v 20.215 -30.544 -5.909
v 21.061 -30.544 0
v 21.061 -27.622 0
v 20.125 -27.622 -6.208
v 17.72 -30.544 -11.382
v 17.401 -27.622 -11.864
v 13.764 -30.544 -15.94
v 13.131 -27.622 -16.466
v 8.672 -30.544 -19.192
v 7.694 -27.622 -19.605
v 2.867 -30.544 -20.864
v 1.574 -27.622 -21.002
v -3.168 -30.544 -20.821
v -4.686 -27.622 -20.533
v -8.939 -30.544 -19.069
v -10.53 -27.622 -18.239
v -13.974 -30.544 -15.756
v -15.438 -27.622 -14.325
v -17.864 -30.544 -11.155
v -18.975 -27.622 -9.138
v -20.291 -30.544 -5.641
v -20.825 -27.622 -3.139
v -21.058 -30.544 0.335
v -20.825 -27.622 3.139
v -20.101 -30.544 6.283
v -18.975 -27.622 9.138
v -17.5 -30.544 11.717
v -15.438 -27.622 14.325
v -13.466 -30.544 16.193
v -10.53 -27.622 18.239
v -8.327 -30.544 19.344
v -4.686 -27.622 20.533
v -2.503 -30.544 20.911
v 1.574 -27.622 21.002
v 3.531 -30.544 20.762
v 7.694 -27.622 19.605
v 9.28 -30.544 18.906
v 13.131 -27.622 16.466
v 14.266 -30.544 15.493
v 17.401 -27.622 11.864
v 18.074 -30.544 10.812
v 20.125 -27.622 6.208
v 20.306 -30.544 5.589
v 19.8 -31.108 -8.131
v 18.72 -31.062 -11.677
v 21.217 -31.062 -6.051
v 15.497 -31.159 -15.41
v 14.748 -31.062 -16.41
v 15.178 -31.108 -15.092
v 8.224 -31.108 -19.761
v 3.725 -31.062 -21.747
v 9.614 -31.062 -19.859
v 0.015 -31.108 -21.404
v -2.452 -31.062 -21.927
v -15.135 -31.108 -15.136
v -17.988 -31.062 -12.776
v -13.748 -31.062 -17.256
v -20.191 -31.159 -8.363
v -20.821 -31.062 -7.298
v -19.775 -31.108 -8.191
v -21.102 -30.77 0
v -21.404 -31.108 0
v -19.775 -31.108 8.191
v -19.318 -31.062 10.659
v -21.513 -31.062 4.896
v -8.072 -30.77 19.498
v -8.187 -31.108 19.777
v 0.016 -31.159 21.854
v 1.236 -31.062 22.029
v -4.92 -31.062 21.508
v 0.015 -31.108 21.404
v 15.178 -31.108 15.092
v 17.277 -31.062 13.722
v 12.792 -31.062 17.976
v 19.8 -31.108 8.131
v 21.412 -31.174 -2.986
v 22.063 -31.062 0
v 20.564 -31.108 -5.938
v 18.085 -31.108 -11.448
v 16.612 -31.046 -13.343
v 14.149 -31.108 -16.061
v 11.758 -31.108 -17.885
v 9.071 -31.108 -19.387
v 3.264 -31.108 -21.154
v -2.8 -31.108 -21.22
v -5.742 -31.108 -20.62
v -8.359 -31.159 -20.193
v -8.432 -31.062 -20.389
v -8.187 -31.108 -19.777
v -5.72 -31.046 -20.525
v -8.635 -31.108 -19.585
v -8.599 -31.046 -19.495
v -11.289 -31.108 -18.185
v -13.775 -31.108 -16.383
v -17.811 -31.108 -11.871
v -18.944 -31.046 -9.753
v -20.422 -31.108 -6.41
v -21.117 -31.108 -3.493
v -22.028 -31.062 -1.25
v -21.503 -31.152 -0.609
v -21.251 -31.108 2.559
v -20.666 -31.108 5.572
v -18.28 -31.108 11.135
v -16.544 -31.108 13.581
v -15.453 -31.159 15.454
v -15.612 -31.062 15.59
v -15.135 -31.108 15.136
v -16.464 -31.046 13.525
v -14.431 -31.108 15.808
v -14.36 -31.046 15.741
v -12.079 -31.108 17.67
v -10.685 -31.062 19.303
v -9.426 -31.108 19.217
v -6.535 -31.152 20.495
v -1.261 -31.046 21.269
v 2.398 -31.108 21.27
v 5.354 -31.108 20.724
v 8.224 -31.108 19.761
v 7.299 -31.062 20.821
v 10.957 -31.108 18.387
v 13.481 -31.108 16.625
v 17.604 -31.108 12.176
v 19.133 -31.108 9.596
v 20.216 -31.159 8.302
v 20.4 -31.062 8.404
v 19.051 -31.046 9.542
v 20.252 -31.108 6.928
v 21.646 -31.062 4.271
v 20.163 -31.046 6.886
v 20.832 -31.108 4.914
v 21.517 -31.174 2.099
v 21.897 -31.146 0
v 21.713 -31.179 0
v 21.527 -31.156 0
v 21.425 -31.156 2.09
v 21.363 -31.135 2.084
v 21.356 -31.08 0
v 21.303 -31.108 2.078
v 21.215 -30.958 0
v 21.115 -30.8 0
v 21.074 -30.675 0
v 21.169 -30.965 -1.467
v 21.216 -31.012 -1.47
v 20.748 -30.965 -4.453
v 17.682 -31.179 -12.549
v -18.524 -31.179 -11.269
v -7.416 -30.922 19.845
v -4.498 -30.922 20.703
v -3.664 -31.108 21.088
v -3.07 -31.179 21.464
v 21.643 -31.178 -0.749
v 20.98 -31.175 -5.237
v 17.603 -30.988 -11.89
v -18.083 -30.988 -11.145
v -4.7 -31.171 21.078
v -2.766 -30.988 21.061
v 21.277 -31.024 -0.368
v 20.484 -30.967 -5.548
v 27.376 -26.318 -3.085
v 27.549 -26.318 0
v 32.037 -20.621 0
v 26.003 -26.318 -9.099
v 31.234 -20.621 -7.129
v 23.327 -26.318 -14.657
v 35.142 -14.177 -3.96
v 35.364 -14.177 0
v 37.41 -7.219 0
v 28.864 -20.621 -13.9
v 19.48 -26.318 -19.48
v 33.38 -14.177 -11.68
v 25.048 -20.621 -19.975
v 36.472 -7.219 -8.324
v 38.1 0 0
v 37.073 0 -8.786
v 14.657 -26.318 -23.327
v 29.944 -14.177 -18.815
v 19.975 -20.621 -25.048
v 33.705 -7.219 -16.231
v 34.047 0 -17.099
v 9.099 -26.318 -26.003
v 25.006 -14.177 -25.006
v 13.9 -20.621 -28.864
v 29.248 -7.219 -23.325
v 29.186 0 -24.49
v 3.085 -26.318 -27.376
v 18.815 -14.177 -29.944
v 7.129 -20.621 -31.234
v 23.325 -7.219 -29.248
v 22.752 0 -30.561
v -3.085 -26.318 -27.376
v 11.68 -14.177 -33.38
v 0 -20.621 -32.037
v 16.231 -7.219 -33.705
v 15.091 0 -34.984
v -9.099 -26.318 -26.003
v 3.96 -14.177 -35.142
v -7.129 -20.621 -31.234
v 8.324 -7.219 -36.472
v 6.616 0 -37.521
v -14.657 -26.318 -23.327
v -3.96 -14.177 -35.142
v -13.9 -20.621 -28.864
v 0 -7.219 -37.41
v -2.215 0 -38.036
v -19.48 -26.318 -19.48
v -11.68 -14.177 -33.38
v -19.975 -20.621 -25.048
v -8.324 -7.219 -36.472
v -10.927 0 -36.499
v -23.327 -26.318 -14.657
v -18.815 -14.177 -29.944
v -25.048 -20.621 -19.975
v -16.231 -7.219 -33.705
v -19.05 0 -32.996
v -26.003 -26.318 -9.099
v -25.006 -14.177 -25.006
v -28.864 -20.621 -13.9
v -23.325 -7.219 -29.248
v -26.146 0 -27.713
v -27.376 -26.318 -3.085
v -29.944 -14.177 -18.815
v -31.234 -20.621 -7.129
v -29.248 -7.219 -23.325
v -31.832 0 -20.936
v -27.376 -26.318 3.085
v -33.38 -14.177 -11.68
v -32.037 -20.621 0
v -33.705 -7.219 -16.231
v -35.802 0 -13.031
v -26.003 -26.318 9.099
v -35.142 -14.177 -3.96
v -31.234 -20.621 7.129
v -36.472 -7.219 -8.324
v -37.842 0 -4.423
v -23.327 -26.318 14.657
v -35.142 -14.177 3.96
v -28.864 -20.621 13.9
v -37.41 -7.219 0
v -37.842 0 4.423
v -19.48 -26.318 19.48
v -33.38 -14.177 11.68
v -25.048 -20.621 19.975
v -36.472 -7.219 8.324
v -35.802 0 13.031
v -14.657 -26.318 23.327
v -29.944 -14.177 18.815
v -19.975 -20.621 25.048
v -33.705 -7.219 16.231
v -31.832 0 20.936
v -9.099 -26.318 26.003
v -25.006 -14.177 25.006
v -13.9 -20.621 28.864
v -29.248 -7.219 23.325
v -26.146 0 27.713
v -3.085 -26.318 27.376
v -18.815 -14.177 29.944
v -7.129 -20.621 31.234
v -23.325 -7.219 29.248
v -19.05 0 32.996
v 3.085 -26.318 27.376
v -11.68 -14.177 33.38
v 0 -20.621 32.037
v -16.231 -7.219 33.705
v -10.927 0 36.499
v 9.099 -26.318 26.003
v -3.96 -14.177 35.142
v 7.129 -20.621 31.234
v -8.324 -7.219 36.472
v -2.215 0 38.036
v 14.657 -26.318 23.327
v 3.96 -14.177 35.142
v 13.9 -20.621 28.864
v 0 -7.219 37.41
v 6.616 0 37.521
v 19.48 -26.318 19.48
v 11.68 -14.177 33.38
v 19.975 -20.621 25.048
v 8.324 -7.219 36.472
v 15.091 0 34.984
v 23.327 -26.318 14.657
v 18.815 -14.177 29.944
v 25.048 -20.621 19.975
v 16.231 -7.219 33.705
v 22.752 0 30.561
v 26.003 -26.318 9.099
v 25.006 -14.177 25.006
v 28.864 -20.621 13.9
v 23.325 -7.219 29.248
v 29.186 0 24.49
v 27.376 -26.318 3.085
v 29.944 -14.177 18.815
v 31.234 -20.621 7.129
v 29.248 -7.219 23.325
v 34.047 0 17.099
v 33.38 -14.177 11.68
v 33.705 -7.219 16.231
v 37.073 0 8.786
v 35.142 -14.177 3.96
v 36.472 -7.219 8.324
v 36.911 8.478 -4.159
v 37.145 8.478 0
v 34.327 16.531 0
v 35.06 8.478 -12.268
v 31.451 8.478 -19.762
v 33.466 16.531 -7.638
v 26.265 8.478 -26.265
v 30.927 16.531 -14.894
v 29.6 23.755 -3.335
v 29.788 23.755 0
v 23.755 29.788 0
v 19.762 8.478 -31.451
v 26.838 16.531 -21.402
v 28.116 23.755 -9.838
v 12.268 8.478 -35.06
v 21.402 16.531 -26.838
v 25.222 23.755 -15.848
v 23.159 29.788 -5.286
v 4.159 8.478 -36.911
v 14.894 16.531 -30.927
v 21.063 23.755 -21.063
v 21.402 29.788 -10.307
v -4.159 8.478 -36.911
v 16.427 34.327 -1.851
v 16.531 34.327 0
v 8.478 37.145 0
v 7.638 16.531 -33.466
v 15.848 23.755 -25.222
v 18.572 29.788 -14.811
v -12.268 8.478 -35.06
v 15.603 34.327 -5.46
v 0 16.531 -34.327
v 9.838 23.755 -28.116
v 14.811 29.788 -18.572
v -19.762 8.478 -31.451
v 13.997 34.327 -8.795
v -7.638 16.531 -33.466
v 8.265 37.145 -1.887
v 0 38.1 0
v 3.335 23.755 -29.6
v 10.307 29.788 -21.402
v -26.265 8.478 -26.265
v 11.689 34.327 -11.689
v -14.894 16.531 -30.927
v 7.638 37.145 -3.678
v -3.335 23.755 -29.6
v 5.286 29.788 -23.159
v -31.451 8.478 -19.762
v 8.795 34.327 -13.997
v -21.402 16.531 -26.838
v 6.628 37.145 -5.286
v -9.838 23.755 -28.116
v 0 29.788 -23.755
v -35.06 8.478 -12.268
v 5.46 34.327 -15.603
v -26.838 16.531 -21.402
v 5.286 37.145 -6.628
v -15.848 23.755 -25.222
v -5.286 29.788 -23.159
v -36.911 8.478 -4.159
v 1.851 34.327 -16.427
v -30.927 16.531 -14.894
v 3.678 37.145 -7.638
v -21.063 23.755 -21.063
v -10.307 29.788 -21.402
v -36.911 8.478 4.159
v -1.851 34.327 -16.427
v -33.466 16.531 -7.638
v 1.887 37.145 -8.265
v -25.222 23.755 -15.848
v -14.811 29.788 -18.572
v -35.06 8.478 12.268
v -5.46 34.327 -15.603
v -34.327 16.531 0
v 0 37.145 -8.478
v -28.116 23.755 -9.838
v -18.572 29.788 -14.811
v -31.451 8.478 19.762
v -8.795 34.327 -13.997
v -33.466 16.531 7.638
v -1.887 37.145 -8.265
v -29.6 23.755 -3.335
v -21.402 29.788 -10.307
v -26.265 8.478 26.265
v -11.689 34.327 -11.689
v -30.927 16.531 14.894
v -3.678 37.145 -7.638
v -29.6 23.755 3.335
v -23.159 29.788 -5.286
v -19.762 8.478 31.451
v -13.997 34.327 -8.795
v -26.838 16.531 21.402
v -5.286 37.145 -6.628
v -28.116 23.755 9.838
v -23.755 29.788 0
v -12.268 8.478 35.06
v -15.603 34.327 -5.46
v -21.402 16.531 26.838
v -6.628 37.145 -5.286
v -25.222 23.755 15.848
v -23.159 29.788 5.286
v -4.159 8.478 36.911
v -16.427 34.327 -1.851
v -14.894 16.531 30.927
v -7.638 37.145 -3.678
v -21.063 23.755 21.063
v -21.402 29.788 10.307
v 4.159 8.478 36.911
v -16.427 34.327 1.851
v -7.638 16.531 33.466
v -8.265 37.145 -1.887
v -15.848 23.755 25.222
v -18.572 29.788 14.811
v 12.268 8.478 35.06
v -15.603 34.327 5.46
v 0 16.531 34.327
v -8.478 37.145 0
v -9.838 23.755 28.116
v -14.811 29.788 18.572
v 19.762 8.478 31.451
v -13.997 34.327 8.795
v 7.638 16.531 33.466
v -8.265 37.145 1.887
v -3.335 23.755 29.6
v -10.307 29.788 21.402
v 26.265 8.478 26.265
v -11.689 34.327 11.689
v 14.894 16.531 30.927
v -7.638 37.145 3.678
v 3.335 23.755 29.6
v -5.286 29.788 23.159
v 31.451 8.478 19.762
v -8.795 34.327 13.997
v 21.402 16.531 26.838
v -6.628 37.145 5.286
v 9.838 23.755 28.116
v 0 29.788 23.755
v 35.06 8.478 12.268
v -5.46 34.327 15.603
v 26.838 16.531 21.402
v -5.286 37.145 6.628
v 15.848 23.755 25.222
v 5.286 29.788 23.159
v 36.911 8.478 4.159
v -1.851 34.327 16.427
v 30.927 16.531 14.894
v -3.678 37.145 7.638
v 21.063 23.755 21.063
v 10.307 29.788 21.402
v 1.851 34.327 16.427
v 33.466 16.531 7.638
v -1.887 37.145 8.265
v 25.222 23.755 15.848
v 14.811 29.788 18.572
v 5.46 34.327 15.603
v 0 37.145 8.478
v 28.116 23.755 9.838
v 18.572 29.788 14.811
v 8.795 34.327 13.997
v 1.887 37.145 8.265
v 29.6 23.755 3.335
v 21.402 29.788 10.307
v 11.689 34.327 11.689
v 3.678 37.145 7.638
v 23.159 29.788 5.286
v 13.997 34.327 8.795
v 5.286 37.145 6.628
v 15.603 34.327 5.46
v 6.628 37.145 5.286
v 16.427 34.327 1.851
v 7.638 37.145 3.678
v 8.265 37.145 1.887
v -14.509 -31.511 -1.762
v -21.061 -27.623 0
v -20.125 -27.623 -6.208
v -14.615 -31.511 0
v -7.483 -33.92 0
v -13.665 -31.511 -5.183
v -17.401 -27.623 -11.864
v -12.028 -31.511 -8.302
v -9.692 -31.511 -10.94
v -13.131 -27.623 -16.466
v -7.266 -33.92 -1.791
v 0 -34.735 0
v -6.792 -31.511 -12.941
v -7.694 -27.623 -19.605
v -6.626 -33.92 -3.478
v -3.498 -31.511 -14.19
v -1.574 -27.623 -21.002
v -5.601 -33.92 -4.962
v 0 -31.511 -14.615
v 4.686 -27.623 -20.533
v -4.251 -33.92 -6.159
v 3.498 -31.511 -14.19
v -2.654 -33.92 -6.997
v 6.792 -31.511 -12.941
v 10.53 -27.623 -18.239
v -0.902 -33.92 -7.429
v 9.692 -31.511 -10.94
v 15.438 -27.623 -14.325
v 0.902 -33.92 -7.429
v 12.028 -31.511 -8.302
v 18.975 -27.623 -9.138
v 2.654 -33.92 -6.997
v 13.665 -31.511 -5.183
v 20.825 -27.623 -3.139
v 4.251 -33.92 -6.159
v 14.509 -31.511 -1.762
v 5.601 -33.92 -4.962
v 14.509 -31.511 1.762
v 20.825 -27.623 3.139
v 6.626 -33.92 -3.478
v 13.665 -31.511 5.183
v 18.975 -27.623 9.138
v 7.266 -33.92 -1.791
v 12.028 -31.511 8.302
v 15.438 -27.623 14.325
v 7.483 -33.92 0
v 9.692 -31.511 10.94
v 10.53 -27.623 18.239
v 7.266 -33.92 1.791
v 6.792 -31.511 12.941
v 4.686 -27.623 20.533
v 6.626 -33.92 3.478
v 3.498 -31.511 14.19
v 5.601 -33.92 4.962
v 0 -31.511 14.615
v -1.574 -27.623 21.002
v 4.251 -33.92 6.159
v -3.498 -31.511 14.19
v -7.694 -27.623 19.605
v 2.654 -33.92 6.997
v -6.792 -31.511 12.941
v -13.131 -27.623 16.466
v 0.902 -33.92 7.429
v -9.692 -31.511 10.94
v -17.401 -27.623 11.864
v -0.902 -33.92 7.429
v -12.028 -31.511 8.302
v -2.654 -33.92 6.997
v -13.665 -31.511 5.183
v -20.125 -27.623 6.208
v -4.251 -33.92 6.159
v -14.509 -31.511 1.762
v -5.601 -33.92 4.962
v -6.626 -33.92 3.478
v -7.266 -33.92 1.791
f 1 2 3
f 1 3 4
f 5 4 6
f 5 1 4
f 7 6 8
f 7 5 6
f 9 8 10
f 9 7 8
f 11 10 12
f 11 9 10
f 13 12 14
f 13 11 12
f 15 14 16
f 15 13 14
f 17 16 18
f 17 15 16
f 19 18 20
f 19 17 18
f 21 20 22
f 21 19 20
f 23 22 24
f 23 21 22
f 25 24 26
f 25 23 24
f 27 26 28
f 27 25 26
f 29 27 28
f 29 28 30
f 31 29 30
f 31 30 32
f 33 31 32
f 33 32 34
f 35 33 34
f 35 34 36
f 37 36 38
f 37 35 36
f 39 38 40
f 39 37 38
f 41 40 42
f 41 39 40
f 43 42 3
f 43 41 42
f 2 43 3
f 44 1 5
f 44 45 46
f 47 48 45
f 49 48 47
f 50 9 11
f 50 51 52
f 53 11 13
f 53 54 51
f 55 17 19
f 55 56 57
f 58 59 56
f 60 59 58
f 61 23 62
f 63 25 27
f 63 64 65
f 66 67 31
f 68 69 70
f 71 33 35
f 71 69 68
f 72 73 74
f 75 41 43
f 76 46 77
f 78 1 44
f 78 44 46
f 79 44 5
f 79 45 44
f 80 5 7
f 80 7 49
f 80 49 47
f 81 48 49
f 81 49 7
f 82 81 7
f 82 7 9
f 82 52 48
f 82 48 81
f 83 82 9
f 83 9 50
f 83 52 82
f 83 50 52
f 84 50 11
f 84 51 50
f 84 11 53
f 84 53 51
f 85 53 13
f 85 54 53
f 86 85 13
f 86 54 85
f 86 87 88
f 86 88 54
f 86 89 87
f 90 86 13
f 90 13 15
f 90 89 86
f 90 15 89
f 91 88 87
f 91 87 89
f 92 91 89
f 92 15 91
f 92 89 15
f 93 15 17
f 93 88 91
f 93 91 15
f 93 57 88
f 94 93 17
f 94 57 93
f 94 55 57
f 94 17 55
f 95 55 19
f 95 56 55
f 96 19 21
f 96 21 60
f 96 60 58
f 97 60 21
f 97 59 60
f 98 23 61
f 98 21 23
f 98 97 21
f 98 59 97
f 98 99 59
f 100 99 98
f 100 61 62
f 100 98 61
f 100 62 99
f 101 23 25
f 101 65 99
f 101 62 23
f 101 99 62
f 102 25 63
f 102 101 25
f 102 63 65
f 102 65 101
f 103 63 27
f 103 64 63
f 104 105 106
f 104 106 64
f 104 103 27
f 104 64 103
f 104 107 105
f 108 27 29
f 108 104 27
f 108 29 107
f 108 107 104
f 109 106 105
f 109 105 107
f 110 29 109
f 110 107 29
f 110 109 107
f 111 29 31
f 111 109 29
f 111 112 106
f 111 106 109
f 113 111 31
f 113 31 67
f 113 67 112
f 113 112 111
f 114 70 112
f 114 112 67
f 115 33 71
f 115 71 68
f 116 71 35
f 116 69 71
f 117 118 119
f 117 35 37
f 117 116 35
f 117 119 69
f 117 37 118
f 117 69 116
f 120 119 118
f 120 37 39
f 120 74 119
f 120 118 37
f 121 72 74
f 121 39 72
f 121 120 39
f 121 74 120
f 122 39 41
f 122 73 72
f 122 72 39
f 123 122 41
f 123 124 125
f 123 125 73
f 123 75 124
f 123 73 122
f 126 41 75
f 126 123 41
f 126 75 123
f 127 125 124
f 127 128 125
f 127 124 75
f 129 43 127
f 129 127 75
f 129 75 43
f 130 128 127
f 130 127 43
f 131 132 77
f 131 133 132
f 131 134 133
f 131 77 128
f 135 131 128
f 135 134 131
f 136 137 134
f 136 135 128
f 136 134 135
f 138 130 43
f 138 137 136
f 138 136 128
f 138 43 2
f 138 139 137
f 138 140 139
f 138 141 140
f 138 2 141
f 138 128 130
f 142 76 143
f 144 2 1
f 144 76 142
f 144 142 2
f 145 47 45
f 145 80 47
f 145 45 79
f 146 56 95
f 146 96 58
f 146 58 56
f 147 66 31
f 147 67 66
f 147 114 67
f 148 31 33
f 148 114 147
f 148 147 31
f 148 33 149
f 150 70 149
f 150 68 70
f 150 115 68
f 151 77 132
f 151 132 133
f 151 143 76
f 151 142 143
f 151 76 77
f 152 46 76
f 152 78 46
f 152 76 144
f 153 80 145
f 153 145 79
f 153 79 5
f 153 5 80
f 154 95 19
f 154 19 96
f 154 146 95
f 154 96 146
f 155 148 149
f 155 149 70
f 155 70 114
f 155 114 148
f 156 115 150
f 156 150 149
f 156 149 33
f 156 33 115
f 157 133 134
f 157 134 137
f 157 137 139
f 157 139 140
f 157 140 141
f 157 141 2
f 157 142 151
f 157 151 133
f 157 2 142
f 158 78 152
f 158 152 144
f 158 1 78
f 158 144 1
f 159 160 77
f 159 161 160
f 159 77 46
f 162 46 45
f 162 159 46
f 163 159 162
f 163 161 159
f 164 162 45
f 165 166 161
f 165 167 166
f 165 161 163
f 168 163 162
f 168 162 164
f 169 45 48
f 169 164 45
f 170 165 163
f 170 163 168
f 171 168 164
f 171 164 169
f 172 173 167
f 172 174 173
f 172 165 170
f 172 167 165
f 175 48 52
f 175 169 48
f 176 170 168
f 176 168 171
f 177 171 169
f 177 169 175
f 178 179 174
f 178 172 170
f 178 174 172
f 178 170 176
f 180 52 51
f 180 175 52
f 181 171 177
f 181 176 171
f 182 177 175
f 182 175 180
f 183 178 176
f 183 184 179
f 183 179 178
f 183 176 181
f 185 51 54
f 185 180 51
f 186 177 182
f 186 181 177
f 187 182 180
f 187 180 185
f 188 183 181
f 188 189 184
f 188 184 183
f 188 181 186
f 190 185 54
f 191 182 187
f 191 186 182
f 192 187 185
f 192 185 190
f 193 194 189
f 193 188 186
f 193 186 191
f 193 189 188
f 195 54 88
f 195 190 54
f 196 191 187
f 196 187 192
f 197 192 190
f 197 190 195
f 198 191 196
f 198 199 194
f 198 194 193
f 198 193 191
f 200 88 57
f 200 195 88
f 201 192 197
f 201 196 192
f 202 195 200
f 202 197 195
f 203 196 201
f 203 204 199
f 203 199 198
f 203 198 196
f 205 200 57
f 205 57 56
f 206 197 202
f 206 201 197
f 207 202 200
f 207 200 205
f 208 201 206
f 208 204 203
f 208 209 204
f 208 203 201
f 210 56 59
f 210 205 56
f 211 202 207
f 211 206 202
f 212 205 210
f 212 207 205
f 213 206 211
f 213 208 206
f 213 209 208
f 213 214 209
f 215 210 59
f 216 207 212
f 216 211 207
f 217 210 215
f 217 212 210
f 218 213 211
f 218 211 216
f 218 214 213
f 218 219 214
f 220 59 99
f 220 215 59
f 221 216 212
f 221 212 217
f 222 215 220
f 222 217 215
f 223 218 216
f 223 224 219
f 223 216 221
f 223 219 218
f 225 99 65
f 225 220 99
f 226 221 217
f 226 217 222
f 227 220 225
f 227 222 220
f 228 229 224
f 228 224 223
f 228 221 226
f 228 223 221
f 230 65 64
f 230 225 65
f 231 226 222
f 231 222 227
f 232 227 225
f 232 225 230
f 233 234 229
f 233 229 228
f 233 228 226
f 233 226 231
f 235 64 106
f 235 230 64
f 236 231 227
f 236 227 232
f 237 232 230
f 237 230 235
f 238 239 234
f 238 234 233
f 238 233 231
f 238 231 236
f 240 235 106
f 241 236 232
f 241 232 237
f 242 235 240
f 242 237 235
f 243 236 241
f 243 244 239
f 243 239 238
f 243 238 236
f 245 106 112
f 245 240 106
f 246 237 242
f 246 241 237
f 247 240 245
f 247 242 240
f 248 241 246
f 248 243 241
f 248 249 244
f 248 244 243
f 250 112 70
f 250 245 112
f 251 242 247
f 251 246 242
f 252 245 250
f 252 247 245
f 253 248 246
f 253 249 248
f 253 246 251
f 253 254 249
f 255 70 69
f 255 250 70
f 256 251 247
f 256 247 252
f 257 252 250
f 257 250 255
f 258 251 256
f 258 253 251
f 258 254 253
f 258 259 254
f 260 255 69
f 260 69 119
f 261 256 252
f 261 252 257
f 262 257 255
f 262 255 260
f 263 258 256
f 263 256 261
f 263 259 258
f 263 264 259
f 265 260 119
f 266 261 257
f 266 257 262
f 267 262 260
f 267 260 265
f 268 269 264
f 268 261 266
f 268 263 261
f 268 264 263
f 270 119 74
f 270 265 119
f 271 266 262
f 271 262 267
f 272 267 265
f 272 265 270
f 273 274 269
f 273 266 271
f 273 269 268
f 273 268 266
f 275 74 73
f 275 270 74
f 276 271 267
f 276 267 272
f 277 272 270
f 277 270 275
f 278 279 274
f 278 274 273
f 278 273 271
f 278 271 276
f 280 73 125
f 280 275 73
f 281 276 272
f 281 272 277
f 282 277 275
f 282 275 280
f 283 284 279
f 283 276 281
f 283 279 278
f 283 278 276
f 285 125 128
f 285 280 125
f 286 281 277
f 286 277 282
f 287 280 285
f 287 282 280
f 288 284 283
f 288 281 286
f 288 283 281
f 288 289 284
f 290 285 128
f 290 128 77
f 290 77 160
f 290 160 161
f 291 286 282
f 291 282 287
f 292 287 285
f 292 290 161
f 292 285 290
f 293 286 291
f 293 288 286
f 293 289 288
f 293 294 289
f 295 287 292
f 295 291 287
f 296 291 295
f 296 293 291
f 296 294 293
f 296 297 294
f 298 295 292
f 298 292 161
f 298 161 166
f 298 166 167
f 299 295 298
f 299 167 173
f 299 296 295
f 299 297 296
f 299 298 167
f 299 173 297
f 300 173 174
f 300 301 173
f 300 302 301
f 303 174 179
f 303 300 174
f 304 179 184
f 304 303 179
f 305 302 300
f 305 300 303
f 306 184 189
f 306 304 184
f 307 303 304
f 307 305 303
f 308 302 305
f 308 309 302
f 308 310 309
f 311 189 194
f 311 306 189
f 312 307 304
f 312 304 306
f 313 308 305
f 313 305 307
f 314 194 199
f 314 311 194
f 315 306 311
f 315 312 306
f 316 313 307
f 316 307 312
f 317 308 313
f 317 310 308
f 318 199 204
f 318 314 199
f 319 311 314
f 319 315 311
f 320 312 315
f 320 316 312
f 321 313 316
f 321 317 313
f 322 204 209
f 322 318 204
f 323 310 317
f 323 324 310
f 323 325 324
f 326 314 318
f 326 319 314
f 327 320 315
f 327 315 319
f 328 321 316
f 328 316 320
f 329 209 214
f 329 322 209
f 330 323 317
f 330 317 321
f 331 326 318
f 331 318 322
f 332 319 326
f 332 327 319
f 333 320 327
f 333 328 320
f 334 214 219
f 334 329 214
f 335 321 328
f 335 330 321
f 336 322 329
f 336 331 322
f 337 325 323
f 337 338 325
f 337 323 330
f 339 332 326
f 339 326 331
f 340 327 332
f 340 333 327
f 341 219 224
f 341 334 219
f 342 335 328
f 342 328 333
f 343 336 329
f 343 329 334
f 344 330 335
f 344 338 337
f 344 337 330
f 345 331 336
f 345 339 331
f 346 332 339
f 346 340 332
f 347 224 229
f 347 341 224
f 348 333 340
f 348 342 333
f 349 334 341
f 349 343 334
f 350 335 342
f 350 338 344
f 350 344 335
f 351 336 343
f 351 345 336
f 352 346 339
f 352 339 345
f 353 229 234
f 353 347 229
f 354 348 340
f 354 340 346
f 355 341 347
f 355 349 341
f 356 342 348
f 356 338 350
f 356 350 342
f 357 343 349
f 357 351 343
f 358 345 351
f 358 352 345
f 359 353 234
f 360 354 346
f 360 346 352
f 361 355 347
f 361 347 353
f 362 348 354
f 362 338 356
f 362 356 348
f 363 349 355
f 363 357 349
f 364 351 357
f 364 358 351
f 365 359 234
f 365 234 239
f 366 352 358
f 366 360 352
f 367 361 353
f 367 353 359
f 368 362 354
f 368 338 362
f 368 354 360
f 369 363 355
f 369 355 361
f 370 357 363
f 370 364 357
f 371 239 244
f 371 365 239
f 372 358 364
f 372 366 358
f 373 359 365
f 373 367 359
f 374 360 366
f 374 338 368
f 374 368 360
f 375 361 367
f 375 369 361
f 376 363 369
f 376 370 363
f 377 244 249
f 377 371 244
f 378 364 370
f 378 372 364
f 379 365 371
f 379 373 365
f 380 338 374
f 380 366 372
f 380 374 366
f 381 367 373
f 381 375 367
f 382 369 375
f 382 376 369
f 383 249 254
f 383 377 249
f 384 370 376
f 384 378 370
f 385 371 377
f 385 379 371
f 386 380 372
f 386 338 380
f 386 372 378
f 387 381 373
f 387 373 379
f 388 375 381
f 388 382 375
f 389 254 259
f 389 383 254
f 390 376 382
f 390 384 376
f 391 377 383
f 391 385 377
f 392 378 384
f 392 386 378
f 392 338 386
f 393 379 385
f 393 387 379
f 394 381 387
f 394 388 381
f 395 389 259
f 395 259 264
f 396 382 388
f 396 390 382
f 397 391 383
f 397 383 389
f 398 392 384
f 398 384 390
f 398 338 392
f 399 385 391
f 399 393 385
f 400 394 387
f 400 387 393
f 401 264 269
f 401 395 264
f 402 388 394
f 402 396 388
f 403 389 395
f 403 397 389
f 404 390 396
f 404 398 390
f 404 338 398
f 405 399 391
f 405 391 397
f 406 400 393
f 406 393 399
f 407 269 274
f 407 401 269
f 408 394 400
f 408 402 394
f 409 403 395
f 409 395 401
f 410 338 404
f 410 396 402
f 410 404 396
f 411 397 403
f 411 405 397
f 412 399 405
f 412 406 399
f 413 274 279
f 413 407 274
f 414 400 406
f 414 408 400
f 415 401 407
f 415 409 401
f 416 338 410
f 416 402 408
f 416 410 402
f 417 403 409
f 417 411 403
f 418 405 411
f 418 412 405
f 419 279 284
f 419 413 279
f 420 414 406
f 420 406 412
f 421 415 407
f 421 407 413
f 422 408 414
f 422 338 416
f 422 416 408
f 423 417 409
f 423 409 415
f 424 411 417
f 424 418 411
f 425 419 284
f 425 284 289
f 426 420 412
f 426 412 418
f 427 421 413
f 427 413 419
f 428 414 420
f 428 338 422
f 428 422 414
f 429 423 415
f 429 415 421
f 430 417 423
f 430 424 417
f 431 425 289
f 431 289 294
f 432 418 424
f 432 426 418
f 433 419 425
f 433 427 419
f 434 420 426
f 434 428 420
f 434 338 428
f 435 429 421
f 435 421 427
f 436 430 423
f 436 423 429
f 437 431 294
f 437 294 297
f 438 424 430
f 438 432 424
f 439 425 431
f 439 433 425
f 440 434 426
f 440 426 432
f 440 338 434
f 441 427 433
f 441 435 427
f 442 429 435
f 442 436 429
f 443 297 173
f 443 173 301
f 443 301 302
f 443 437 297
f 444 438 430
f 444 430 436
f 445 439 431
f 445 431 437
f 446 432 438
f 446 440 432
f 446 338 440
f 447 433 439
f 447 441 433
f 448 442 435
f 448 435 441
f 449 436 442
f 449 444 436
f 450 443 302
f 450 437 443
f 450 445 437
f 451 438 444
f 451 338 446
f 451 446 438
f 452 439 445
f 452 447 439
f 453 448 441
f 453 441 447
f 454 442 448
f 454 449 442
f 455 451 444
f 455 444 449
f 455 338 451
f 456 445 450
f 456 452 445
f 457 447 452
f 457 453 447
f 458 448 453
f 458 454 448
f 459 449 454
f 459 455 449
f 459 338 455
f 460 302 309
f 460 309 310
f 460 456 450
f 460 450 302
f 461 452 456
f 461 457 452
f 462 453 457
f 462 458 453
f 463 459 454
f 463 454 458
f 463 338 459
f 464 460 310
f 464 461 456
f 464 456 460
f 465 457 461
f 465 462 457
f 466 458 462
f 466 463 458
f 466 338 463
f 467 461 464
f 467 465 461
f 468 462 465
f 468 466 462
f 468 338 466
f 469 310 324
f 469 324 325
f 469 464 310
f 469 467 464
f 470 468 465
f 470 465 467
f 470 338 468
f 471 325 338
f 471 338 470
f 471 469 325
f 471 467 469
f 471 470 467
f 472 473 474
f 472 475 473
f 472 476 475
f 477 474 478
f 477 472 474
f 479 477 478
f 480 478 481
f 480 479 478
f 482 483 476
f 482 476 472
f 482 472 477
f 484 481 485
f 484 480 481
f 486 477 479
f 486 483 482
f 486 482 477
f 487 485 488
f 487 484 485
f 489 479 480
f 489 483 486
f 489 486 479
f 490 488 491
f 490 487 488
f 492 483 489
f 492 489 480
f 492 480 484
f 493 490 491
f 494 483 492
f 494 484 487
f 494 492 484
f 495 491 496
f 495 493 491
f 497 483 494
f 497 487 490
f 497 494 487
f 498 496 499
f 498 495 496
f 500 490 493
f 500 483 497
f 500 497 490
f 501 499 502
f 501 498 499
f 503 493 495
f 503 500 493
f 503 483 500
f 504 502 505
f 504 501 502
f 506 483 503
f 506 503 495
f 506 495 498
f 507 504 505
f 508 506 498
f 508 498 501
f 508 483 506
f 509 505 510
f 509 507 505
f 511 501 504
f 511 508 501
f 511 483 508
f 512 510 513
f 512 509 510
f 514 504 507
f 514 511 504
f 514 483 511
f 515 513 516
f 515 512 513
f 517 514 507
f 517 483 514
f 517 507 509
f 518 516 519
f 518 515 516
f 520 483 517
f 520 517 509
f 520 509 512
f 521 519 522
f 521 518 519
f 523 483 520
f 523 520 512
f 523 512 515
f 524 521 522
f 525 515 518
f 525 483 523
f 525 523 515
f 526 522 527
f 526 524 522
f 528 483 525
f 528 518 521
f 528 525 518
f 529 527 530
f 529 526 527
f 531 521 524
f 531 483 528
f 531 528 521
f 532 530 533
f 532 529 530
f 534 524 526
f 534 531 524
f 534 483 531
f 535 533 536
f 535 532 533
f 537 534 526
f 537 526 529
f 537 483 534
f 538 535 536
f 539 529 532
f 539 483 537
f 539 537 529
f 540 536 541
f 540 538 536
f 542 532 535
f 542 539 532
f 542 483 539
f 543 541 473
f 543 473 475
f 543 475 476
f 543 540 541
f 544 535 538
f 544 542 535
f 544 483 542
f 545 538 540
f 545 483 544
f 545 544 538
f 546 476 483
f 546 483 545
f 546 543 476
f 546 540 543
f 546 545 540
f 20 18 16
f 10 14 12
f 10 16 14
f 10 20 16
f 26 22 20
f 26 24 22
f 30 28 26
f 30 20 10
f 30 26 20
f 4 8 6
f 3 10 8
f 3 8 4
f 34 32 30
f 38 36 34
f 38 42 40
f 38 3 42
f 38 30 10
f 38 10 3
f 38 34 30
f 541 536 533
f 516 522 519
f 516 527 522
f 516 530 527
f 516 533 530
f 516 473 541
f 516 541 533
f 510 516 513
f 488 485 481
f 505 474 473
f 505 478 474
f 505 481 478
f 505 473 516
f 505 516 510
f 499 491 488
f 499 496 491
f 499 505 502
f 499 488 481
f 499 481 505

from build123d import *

# Parameters (mm, degrees)
F3_R     = 21.1666666667
F4_DEPTH = 25.4
F5_DEPTH = 4.1275
F6_R     = 0.635


with BuildPart() as f1:
    # F0 (on Top) → F1 (revolve)
    with BuildSketch(Plane.XY):
        with BuildLine():
            ThreePointArc((0, -38.1), (26.9407683632, -26.9407683632), (38.1, 0))
            ThreePointArc((38.1, 0), (26.9407683632, 26.9407683632), (0, 38.1))
            Line((0, 38.1), (0, 0))
            Line((0, 0), (0, -38.1))
        make_face()
    revolve(axis=Axis((0, 19.05, 0), (0, 1, 0)))

    # F3 (on offset) → F4 (cut)
    with BuildSketch(Plane.XZ.offset(31.75)):
        Circle(F3_R)
    extrude(amount=F4_DEPTH, mode=Mode.SUBTRACT)

    # F5 (cut): a face of the model
    f5_faces = [f1.faces().sort_by_distance(p)[0] for p in [
        (0, -31.75, 0),
    ]]
    extrude(f5_faces, amount=-F5_DEPTH, mode=Mode.SUBTRACT)

    # F6
    f6_edges = [f1.edges().sort_by_distance(p)[0] for p in [
        (-21.060567, -31.75, 0),
    ]]
    fillet(f6_edges, radius=F6_R)


with BuildPart() as f8:
    # F7 (on Top) → F8 (revolve)
    with BuildSketch(Plane.XY):
        with BuildLine():
            Line((0, -27.6225), (-21.0605674188, -27.6225))
            ThreePointArc((-21.0605674188, -27.6225), (-11.1146441075, -32.9091885742), (0, -34.7354286896))
            Line((0, -34.7354286896), (0, -27.6225))
        make_face()
    revolve(axis=Axis((0, -31.1789643448, 0), (0, -1, 0)))


solid = Compound([f1.part, f8.part])
